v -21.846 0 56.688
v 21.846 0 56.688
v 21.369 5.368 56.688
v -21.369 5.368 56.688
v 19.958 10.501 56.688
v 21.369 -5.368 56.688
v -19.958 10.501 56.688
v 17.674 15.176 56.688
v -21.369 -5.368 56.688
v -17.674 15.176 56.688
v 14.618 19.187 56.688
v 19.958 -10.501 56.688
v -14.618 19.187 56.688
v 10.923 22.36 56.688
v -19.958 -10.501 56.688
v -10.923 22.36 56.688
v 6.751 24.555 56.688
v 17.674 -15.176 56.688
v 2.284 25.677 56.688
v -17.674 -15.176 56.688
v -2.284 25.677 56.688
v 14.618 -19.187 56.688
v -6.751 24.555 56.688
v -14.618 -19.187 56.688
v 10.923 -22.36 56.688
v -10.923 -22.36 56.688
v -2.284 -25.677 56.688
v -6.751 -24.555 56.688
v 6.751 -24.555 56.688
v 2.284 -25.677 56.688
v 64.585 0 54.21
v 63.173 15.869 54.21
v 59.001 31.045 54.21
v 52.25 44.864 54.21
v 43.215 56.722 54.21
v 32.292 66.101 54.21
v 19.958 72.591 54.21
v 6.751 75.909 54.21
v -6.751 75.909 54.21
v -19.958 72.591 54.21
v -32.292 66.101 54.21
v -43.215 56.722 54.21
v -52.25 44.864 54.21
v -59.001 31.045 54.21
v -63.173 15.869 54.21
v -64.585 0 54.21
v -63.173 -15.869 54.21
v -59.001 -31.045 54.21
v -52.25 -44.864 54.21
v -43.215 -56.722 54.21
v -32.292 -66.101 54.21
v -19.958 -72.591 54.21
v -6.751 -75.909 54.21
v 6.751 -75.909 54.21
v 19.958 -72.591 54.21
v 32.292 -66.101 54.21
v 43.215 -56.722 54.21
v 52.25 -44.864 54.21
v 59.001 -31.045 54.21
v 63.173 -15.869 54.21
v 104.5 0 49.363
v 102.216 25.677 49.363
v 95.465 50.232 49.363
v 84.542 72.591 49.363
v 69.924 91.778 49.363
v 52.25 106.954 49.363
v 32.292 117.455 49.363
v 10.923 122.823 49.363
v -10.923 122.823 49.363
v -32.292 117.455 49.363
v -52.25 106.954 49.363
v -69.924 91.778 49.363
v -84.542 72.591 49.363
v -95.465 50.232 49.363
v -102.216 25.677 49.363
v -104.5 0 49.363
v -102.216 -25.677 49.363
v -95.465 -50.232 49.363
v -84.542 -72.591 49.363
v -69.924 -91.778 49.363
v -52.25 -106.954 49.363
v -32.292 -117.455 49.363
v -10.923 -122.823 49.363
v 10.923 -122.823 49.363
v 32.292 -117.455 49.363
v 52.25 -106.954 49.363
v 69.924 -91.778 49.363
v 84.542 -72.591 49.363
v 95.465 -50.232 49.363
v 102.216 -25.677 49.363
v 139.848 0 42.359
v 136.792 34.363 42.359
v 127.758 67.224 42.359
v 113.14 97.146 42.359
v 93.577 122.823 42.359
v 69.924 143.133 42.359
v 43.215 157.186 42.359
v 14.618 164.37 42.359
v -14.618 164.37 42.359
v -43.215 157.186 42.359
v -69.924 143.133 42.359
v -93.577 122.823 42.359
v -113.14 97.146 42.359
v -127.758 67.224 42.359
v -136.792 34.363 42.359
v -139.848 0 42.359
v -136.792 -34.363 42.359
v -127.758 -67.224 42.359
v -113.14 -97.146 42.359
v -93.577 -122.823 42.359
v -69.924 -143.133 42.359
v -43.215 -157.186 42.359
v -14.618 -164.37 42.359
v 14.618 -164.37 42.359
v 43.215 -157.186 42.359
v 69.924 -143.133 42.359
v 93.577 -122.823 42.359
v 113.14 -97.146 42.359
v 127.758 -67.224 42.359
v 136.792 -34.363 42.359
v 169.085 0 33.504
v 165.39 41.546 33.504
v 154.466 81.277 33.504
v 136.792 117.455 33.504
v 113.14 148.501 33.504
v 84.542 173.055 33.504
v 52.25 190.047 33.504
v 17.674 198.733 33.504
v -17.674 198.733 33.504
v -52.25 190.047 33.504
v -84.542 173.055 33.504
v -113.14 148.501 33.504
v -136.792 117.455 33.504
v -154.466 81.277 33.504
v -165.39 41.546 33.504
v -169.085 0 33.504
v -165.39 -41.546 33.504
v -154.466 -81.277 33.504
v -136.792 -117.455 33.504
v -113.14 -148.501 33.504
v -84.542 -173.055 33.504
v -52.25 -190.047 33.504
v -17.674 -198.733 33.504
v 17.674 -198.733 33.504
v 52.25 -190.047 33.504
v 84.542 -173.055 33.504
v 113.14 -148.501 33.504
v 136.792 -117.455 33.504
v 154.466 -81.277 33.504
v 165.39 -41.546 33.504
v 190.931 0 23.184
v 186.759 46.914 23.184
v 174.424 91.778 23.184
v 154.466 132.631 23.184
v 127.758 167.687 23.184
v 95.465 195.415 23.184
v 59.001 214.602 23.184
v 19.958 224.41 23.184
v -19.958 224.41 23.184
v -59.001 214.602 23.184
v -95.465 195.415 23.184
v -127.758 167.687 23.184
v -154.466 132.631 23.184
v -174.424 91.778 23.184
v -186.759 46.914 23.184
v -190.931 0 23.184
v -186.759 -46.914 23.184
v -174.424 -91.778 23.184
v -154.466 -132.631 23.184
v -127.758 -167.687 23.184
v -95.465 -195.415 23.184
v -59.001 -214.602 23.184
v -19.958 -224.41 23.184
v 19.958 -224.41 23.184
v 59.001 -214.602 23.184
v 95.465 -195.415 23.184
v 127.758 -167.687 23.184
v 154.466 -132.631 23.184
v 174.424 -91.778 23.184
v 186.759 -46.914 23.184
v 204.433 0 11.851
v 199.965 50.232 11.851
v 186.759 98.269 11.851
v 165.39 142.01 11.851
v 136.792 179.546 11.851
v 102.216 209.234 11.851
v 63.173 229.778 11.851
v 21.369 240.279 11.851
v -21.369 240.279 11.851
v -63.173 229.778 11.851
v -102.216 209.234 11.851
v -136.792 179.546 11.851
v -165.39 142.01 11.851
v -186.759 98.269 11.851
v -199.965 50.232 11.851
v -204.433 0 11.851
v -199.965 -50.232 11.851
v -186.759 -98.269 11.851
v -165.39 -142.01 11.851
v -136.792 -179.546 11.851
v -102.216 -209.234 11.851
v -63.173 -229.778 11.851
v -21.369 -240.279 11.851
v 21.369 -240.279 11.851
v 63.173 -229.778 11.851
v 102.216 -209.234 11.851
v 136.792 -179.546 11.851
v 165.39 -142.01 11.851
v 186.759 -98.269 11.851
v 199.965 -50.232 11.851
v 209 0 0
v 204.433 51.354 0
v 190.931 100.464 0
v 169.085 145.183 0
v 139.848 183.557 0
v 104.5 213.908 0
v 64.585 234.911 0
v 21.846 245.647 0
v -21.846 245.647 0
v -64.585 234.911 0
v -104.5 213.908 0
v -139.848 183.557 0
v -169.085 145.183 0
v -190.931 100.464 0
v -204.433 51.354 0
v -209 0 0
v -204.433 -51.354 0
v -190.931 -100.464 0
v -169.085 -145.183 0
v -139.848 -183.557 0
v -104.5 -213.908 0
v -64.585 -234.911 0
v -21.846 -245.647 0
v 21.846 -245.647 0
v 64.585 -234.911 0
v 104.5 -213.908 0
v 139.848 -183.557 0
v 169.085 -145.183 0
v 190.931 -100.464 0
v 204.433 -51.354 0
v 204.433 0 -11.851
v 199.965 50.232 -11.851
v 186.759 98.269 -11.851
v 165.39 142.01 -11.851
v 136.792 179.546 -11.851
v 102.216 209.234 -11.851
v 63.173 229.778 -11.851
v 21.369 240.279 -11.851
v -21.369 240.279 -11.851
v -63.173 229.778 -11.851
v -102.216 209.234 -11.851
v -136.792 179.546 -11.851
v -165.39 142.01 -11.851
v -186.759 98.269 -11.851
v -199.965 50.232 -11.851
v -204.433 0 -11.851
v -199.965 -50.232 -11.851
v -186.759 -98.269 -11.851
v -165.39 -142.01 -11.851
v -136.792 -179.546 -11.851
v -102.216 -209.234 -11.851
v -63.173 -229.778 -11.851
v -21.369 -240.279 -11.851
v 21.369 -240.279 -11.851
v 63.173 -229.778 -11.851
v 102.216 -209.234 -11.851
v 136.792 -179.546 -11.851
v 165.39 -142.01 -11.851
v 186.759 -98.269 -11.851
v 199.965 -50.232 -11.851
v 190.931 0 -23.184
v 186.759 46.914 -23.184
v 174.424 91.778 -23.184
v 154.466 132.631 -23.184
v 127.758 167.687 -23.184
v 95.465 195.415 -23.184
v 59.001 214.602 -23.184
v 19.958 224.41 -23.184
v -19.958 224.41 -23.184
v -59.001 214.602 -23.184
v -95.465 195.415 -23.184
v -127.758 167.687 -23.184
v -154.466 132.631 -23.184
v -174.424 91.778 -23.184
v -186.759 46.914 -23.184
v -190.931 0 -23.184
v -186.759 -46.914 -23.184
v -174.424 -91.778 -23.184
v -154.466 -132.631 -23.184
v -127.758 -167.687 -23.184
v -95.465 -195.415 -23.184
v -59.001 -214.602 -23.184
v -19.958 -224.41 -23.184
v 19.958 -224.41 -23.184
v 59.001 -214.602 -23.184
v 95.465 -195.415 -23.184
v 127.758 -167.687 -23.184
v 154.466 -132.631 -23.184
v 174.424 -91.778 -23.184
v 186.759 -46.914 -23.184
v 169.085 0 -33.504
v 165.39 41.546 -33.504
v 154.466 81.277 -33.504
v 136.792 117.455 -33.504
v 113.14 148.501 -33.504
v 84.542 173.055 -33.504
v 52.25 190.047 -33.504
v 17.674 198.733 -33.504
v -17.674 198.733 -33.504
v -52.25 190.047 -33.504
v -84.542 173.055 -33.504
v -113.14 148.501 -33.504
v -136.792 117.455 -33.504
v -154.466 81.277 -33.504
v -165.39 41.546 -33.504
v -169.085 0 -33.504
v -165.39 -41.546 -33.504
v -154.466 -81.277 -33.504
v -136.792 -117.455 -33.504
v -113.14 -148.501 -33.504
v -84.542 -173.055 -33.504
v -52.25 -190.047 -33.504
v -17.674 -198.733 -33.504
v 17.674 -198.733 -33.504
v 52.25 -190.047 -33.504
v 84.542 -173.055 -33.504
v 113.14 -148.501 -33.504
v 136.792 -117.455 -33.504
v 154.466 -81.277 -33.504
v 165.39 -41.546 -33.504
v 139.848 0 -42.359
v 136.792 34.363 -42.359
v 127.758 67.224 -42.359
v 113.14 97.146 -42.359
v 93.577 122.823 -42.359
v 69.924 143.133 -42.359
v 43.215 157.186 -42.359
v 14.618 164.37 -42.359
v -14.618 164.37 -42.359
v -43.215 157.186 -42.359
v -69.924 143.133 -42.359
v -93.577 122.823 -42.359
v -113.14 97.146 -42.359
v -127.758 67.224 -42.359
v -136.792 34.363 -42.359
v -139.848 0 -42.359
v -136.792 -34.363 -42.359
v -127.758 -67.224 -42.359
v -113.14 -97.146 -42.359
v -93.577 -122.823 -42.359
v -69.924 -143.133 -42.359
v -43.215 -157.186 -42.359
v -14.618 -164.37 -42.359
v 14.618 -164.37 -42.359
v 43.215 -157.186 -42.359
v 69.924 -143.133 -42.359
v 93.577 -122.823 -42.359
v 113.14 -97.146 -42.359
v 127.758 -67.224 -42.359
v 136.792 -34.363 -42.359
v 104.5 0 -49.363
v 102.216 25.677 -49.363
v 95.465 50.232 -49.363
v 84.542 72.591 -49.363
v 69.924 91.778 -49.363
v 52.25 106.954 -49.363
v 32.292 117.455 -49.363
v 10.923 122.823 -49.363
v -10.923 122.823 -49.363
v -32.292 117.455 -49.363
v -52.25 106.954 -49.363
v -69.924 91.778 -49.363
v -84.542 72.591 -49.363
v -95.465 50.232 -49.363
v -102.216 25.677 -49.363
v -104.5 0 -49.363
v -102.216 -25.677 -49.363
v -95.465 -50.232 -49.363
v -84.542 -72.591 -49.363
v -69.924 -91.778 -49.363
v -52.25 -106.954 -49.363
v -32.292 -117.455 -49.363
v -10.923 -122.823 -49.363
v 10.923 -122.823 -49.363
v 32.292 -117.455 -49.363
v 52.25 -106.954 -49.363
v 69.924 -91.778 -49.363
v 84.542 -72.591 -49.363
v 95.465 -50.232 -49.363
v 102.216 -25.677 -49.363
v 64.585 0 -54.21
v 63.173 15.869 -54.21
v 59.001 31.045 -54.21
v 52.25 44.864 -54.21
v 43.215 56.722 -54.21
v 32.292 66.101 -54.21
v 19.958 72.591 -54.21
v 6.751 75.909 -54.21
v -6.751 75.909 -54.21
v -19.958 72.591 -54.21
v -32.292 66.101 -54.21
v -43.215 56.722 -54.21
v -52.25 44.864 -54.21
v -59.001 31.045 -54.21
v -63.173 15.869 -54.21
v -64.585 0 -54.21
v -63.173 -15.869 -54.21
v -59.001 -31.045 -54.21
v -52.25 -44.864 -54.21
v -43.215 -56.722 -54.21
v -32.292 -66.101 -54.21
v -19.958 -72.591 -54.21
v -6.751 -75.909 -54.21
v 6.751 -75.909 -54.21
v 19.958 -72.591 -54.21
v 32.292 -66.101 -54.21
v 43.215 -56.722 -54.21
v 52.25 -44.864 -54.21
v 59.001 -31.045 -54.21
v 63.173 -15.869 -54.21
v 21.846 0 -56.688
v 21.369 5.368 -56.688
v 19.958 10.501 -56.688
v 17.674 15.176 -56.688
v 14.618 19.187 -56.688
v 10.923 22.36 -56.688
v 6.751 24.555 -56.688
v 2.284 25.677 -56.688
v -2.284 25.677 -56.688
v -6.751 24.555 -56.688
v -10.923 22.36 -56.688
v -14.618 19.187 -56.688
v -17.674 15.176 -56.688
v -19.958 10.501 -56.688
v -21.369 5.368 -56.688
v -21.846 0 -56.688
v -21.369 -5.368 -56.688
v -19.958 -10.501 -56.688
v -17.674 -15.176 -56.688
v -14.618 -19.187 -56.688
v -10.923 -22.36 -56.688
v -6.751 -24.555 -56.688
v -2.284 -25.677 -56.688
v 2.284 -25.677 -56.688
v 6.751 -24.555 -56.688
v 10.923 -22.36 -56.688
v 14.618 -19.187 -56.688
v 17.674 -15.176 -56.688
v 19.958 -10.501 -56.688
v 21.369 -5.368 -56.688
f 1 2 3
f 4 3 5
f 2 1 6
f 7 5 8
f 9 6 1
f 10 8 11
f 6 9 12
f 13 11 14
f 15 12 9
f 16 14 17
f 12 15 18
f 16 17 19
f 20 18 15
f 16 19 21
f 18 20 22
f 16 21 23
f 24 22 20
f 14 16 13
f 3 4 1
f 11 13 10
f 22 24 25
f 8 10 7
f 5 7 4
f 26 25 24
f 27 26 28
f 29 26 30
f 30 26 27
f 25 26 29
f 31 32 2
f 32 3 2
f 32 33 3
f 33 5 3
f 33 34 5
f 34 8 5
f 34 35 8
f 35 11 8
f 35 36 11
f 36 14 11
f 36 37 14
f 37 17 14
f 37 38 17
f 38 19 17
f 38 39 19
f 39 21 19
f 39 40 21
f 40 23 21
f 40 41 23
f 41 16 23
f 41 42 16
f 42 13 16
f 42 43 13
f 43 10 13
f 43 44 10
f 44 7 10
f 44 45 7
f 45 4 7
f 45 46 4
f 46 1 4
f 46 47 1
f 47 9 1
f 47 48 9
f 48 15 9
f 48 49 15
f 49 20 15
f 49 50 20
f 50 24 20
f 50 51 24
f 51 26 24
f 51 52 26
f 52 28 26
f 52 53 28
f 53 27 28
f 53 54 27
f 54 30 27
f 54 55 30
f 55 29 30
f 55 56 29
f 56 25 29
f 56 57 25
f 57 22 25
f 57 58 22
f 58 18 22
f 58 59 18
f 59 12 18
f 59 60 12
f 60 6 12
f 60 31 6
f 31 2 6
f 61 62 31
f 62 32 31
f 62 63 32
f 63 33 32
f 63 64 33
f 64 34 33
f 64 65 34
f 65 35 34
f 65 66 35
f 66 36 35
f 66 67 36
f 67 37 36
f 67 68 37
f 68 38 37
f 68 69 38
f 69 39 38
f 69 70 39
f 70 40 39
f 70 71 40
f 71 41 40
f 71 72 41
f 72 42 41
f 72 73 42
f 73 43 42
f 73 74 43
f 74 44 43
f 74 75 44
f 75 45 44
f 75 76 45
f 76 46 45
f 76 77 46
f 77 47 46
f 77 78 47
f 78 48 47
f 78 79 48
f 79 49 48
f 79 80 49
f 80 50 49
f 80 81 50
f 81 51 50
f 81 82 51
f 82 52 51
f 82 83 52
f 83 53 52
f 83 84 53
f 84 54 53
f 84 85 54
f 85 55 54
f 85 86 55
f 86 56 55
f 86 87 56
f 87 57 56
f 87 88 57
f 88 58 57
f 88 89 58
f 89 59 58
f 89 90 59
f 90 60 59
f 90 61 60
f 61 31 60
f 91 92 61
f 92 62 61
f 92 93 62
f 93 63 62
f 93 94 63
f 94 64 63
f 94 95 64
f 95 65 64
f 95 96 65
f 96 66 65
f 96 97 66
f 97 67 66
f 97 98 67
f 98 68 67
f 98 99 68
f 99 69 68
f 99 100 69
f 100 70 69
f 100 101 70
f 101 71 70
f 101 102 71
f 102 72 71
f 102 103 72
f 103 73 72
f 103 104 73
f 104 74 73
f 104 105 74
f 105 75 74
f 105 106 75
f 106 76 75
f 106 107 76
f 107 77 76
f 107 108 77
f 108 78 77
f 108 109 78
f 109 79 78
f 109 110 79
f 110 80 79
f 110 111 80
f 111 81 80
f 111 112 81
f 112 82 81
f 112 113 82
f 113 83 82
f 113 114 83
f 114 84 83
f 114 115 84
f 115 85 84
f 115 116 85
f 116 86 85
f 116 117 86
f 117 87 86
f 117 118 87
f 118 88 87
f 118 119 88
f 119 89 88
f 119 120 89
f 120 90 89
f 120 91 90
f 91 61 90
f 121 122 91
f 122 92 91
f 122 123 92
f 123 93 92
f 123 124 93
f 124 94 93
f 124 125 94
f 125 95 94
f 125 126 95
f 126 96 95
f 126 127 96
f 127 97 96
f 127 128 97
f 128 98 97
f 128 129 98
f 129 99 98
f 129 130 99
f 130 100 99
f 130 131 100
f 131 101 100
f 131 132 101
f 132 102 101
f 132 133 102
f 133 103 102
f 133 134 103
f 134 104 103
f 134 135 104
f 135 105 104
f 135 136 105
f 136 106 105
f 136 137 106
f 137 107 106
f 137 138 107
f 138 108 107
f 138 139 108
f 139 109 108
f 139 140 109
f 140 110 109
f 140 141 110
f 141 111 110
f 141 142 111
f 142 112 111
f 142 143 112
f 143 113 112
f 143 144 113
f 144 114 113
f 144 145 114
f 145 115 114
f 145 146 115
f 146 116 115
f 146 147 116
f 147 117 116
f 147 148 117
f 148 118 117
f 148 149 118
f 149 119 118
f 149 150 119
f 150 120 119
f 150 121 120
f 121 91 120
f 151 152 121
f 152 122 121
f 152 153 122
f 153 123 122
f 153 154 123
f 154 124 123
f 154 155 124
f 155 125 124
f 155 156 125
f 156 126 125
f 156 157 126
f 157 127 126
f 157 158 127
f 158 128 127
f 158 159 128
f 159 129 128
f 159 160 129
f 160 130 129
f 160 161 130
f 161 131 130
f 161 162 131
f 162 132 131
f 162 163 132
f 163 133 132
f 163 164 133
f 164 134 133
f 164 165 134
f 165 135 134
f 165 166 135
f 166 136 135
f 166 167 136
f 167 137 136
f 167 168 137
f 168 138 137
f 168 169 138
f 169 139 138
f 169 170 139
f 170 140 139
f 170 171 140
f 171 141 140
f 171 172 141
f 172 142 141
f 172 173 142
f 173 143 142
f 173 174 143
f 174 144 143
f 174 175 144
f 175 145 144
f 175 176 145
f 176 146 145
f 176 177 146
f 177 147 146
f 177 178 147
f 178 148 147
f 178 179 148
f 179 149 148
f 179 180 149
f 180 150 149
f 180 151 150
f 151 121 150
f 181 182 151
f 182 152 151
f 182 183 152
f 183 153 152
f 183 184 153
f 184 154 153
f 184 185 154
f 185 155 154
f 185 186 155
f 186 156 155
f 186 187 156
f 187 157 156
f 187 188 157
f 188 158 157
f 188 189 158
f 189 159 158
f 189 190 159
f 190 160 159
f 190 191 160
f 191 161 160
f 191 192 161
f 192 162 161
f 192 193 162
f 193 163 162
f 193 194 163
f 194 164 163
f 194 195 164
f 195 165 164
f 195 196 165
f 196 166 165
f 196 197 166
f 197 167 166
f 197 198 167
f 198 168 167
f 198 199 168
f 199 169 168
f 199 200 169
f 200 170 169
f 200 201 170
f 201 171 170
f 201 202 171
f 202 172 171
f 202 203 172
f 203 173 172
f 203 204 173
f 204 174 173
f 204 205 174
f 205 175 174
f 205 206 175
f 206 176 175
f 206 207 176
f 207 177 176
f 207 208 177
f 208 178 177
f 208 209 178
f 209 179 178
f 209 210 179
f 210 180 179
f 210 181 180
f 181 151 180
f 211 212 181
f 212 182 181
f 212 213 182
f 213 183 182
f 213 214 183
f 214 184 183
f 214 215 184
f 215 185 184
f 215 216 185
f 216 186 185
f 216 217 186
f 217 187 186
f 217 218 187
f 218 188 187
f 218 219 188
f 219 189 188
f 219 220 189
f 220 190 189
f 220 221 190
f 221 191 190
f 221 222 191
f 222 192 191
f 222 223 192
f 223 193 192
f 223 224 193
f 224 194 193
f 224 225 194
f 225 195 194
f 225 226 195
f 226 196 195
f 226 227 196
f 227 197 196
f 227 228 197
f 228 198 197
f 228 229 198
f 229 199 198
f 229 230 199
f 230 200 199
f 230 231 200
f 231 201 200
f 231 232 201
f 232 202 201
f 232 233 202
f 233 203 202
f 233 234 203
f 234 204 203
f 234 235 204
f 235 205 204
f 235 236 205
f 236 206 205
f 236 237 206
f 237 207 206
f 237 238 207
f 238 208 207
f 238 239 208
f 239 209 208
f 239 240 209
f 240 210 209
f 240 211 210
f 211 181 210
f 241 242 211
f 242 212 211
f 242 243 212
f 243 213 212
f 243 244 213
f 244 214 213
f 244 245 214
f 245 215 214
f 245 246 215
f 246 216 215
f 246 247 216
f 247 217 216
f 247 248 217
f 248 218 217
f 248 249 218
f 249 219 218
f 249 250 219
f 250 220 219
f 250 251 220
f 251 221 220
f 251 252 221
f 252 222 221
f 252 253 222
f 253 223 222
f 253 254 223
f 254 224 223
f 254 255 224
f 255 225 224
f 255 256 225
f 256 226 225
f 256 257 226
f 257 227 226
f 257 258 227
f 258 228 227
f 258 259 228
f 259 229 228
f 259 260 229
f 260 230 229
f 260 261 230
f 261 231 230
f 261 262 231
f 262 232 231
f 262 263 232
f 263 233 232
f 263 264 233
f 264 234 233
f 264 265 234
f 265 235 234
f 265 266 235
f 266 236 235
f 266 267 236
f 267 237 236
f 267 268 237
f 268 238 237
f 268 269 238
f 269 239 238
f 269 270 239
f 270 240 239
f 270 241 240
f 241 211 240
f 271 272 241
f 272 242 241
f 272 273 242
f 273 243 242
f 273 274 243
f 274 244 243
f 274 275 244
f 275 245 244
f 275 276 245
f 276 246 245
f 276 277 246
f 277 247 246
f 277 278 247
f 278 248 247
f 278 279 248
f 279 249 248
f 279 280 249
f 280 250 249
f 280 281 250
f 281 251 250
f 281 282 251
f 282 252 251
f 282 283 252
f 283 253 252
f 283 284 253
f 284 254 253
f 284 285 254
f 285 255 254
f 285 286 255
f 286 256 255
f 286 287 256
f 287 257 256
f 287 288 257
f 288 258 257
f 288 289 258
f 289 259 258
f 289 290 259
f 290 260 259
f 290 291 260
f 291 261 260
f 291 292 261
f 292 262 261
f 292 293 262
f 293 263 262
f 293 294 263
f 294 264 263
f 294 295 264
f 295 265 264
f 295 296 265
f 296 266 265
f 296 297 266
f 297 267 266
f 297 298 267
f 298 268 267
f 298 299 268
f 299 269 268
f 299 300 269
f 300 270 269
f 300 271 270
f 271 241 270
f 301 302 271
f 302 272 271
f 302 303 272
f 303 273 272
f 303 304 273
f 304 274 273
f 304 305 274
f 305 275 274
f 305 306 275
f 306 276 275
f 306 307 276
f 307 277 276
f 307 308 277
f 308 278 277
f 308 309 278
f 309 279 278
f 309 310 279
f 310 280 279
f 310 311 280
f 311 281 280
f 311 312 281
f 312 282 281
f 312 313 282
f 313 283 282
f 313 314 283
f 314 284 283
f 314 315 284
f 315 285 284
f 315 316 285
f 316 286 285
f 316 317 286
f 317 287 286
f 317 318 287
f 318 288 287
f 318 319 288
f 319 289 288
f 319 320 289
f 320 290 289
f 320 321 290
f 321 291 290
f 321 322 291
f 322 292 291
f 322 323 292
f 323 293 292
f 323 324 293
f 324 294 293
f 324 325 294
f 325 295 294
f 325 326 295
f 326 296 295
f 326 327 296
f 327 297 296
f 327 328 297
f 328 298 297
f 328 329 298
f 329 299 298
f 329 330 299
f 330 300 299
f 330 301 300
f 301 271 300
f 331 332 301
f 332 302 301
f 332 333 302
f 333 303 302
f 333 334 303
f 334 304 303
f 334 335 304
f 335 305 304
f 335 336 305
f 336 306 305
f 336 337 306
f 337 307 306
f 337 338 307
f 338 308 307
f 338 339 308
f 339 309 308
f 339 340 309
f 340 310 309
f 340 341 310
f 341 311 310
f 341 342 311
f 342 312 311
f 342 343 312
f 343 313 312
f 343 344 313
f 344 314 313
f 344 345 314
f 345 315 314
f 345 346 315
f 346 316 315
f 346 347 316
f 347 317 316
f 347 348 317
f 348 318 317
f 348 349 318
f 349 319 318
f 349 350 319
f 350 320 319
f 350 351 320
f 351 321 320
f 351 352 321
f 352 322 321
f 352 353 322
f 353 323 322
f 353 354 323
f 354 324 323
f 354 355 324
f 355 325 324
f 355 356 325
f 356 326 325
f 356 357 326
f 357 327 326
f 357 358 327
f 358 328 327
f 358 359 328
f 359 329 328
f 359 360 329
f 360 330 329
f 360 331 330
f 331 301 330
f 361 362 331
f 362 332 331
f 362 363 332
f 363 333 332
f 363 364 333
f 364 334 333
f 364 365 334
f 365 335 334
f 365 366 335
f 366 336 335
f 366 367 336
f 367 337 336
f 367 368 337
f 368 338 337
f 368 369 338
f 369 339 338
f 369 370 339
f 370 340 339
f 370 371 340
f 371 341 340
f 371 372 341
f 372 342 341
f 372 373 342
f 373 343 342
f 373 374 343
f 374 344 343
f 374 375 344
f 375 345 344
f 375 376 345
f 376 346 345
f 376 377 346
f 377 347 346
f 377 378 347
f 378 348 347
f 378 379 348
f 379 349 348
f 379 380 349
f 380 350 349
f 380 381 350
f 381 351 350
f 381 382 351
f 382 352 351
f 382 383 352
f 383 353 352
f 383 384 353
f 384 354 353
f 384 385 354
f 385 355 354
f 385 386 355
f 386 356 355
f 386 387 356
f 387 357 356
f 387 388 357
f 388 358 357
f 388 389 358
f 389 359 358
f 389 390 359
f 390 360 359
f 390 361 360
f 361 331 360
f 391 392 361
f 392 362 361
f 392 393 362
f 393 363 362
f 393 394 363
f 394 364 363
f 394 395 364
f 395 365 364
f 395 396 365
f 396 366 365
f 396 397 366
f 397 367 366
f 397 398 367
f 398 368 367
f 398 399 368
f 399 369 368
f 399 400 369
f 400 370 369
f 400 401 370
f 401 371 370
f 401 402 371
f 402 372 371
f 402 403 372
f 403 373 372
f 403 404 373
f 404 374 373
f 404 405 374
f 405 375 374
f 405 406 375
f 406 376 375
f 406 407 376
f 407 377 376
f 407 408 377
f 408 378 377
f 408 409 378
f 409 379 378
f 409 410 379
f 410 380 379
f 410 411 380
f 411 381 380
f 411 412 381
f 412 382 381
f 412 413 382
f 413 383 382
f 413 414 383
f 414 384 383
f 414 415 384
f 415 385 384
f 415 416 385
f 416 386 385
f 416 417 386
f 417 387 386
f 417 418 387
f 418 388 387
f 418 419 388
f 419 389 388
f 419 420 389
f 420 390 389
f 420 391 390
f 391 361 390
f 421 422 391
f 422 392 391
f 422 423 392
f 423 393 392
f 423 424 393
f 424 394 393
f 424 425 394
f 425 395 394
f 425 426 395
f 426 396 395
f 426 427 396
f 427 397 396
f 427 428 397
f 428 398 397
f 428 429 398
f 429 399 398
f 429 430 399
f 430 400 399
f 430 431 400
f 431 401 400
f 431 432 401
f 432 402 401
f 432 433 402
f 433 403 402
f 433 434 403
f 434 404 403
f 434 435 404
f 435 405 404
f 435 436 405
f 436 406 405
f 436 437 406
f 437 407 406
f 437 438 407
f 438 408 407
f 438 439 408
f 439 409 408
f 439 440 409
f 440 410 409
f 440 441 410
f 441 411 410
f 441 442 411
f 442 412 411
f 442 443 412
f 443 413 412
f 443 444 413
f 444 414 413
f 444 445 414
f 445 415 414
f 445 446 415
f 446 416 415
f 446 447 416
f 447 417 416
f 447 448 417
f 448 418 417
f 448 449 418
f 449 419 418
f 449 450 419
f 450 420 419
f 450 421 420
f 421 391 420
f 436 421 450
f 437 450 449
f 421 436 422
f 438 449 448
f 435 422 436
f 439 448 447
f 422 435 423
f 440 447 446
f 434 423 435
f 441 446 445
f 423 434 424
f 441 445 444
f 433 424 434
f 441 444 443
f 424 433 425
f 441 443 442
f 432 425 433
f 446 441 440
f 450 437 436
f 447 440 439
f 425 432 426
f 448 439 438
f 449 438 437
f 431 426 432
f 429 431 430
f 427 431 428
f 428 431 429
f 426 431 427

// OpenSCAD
// Generated by SolidPython 1.0.1 on 2020-07-29 00:46:49


scale(v = [11, 13, 3]) {
	sphere(r = 19);
}
/***********************************************
*********      SolidPython code:      **********
************************************************
 
# import packages: SolidPython
from solid import *
from solid.utils import *
from itertools import chain, combinations, permutations


class Resize:

    def __init__(self, scad_file):
        self.scad_file = scad_file
        #self.scad_file = import_scad(scad_file)
        # cone/cylinder param:
        self.r1 = 0
        self.r2 = 0
        self.h = 0
        # rectangular prism param:
        self.w = 0
        self.l = 0
        # ellipse param:
        self.r = 0

    # import OpenScad code (file name corresponds to shape)


    # classify shape + parameters
    def assign(self, param1, param2, param3):
        if self.scad_file == 'cone.scad':
            self.r1 = param1
            self.r2 = param2
            self.h = param3
        elif self.scad_file == 'cylinder.scad':
            self.r1 = param1
            self.r2 = param2
            self.h = param3
        elif self.scad_file == 'rectangularPrism.scad':
            self.h = param1
            self.l = param2
            self.w = param3
        else:
            self.r = param1
            self.h = param2

    # resize parameters
    def iterate(self):
        x = range(3, 20, 2)
        i = 1
        if self.scad_file == 'cone.scad':
            tempList = list(permutations(x, 2))
            for temp in tempList:
                param1 = temp[0]
                param2 = temp[1]
                filepath = 'produced_scad_files/' + 'cone' + str(param1) + '_' + str(param2) + '_' + '.scad'
                scad_render_to_file(cylinder(h=param1, r1=param2, r2=0), filepath)

        elif self.scad_file == 'cylinder.scad':
            tempList = list(permutations(x, 3))
            for temp in tempList:
                param1 = temp[0]
                param2 = temp[1]
                filepath = 'produced_scad_files/' + 'cylinder' + str(param1) + '_' + str(param2) + '_' + '.scad'
                scad_render_to_file(cylinder(h=param1, r1=param2, r2=param2), filepath)

        elif self.scad_file == 'rectangularPrism.scad':
            tempList = list(permutations(x, 3))
            for temp in tempList:
                param1 = temp[0]
                param2 = temp[1]
                param3 = temp[2]
                filepath = 'produced_scad_files/' + 'rectangularPrism' + str(param1) + '_' + str(param2) + '_' + str(
                    param3) + '.scad'
                scad_render_to_file(cube(size=(param1, param2, param3)), filepath)

        elif self.scad_file == 'ellipse.scad':
            tempList = list(permutations(x, 4))
            for temp in tempList:
                param1 = temp[0]
                param2 = temp[1]
                param3 = temp[2]
                param4 = temp[3]
                filepath = 'produced_scad_files/' + 'ellipse' + str(param1) + '_' + str(param2) + '_' + str(param3) + '_' + str(param4) + '.scad'
                scad_render_to_file(scale([param1, param2, param3])(sphere(r=param4)), filepath)

    def render_to_scadfile(self):
        scad_render_to_file(scad, 'example.scad') 
 
************************************************/
